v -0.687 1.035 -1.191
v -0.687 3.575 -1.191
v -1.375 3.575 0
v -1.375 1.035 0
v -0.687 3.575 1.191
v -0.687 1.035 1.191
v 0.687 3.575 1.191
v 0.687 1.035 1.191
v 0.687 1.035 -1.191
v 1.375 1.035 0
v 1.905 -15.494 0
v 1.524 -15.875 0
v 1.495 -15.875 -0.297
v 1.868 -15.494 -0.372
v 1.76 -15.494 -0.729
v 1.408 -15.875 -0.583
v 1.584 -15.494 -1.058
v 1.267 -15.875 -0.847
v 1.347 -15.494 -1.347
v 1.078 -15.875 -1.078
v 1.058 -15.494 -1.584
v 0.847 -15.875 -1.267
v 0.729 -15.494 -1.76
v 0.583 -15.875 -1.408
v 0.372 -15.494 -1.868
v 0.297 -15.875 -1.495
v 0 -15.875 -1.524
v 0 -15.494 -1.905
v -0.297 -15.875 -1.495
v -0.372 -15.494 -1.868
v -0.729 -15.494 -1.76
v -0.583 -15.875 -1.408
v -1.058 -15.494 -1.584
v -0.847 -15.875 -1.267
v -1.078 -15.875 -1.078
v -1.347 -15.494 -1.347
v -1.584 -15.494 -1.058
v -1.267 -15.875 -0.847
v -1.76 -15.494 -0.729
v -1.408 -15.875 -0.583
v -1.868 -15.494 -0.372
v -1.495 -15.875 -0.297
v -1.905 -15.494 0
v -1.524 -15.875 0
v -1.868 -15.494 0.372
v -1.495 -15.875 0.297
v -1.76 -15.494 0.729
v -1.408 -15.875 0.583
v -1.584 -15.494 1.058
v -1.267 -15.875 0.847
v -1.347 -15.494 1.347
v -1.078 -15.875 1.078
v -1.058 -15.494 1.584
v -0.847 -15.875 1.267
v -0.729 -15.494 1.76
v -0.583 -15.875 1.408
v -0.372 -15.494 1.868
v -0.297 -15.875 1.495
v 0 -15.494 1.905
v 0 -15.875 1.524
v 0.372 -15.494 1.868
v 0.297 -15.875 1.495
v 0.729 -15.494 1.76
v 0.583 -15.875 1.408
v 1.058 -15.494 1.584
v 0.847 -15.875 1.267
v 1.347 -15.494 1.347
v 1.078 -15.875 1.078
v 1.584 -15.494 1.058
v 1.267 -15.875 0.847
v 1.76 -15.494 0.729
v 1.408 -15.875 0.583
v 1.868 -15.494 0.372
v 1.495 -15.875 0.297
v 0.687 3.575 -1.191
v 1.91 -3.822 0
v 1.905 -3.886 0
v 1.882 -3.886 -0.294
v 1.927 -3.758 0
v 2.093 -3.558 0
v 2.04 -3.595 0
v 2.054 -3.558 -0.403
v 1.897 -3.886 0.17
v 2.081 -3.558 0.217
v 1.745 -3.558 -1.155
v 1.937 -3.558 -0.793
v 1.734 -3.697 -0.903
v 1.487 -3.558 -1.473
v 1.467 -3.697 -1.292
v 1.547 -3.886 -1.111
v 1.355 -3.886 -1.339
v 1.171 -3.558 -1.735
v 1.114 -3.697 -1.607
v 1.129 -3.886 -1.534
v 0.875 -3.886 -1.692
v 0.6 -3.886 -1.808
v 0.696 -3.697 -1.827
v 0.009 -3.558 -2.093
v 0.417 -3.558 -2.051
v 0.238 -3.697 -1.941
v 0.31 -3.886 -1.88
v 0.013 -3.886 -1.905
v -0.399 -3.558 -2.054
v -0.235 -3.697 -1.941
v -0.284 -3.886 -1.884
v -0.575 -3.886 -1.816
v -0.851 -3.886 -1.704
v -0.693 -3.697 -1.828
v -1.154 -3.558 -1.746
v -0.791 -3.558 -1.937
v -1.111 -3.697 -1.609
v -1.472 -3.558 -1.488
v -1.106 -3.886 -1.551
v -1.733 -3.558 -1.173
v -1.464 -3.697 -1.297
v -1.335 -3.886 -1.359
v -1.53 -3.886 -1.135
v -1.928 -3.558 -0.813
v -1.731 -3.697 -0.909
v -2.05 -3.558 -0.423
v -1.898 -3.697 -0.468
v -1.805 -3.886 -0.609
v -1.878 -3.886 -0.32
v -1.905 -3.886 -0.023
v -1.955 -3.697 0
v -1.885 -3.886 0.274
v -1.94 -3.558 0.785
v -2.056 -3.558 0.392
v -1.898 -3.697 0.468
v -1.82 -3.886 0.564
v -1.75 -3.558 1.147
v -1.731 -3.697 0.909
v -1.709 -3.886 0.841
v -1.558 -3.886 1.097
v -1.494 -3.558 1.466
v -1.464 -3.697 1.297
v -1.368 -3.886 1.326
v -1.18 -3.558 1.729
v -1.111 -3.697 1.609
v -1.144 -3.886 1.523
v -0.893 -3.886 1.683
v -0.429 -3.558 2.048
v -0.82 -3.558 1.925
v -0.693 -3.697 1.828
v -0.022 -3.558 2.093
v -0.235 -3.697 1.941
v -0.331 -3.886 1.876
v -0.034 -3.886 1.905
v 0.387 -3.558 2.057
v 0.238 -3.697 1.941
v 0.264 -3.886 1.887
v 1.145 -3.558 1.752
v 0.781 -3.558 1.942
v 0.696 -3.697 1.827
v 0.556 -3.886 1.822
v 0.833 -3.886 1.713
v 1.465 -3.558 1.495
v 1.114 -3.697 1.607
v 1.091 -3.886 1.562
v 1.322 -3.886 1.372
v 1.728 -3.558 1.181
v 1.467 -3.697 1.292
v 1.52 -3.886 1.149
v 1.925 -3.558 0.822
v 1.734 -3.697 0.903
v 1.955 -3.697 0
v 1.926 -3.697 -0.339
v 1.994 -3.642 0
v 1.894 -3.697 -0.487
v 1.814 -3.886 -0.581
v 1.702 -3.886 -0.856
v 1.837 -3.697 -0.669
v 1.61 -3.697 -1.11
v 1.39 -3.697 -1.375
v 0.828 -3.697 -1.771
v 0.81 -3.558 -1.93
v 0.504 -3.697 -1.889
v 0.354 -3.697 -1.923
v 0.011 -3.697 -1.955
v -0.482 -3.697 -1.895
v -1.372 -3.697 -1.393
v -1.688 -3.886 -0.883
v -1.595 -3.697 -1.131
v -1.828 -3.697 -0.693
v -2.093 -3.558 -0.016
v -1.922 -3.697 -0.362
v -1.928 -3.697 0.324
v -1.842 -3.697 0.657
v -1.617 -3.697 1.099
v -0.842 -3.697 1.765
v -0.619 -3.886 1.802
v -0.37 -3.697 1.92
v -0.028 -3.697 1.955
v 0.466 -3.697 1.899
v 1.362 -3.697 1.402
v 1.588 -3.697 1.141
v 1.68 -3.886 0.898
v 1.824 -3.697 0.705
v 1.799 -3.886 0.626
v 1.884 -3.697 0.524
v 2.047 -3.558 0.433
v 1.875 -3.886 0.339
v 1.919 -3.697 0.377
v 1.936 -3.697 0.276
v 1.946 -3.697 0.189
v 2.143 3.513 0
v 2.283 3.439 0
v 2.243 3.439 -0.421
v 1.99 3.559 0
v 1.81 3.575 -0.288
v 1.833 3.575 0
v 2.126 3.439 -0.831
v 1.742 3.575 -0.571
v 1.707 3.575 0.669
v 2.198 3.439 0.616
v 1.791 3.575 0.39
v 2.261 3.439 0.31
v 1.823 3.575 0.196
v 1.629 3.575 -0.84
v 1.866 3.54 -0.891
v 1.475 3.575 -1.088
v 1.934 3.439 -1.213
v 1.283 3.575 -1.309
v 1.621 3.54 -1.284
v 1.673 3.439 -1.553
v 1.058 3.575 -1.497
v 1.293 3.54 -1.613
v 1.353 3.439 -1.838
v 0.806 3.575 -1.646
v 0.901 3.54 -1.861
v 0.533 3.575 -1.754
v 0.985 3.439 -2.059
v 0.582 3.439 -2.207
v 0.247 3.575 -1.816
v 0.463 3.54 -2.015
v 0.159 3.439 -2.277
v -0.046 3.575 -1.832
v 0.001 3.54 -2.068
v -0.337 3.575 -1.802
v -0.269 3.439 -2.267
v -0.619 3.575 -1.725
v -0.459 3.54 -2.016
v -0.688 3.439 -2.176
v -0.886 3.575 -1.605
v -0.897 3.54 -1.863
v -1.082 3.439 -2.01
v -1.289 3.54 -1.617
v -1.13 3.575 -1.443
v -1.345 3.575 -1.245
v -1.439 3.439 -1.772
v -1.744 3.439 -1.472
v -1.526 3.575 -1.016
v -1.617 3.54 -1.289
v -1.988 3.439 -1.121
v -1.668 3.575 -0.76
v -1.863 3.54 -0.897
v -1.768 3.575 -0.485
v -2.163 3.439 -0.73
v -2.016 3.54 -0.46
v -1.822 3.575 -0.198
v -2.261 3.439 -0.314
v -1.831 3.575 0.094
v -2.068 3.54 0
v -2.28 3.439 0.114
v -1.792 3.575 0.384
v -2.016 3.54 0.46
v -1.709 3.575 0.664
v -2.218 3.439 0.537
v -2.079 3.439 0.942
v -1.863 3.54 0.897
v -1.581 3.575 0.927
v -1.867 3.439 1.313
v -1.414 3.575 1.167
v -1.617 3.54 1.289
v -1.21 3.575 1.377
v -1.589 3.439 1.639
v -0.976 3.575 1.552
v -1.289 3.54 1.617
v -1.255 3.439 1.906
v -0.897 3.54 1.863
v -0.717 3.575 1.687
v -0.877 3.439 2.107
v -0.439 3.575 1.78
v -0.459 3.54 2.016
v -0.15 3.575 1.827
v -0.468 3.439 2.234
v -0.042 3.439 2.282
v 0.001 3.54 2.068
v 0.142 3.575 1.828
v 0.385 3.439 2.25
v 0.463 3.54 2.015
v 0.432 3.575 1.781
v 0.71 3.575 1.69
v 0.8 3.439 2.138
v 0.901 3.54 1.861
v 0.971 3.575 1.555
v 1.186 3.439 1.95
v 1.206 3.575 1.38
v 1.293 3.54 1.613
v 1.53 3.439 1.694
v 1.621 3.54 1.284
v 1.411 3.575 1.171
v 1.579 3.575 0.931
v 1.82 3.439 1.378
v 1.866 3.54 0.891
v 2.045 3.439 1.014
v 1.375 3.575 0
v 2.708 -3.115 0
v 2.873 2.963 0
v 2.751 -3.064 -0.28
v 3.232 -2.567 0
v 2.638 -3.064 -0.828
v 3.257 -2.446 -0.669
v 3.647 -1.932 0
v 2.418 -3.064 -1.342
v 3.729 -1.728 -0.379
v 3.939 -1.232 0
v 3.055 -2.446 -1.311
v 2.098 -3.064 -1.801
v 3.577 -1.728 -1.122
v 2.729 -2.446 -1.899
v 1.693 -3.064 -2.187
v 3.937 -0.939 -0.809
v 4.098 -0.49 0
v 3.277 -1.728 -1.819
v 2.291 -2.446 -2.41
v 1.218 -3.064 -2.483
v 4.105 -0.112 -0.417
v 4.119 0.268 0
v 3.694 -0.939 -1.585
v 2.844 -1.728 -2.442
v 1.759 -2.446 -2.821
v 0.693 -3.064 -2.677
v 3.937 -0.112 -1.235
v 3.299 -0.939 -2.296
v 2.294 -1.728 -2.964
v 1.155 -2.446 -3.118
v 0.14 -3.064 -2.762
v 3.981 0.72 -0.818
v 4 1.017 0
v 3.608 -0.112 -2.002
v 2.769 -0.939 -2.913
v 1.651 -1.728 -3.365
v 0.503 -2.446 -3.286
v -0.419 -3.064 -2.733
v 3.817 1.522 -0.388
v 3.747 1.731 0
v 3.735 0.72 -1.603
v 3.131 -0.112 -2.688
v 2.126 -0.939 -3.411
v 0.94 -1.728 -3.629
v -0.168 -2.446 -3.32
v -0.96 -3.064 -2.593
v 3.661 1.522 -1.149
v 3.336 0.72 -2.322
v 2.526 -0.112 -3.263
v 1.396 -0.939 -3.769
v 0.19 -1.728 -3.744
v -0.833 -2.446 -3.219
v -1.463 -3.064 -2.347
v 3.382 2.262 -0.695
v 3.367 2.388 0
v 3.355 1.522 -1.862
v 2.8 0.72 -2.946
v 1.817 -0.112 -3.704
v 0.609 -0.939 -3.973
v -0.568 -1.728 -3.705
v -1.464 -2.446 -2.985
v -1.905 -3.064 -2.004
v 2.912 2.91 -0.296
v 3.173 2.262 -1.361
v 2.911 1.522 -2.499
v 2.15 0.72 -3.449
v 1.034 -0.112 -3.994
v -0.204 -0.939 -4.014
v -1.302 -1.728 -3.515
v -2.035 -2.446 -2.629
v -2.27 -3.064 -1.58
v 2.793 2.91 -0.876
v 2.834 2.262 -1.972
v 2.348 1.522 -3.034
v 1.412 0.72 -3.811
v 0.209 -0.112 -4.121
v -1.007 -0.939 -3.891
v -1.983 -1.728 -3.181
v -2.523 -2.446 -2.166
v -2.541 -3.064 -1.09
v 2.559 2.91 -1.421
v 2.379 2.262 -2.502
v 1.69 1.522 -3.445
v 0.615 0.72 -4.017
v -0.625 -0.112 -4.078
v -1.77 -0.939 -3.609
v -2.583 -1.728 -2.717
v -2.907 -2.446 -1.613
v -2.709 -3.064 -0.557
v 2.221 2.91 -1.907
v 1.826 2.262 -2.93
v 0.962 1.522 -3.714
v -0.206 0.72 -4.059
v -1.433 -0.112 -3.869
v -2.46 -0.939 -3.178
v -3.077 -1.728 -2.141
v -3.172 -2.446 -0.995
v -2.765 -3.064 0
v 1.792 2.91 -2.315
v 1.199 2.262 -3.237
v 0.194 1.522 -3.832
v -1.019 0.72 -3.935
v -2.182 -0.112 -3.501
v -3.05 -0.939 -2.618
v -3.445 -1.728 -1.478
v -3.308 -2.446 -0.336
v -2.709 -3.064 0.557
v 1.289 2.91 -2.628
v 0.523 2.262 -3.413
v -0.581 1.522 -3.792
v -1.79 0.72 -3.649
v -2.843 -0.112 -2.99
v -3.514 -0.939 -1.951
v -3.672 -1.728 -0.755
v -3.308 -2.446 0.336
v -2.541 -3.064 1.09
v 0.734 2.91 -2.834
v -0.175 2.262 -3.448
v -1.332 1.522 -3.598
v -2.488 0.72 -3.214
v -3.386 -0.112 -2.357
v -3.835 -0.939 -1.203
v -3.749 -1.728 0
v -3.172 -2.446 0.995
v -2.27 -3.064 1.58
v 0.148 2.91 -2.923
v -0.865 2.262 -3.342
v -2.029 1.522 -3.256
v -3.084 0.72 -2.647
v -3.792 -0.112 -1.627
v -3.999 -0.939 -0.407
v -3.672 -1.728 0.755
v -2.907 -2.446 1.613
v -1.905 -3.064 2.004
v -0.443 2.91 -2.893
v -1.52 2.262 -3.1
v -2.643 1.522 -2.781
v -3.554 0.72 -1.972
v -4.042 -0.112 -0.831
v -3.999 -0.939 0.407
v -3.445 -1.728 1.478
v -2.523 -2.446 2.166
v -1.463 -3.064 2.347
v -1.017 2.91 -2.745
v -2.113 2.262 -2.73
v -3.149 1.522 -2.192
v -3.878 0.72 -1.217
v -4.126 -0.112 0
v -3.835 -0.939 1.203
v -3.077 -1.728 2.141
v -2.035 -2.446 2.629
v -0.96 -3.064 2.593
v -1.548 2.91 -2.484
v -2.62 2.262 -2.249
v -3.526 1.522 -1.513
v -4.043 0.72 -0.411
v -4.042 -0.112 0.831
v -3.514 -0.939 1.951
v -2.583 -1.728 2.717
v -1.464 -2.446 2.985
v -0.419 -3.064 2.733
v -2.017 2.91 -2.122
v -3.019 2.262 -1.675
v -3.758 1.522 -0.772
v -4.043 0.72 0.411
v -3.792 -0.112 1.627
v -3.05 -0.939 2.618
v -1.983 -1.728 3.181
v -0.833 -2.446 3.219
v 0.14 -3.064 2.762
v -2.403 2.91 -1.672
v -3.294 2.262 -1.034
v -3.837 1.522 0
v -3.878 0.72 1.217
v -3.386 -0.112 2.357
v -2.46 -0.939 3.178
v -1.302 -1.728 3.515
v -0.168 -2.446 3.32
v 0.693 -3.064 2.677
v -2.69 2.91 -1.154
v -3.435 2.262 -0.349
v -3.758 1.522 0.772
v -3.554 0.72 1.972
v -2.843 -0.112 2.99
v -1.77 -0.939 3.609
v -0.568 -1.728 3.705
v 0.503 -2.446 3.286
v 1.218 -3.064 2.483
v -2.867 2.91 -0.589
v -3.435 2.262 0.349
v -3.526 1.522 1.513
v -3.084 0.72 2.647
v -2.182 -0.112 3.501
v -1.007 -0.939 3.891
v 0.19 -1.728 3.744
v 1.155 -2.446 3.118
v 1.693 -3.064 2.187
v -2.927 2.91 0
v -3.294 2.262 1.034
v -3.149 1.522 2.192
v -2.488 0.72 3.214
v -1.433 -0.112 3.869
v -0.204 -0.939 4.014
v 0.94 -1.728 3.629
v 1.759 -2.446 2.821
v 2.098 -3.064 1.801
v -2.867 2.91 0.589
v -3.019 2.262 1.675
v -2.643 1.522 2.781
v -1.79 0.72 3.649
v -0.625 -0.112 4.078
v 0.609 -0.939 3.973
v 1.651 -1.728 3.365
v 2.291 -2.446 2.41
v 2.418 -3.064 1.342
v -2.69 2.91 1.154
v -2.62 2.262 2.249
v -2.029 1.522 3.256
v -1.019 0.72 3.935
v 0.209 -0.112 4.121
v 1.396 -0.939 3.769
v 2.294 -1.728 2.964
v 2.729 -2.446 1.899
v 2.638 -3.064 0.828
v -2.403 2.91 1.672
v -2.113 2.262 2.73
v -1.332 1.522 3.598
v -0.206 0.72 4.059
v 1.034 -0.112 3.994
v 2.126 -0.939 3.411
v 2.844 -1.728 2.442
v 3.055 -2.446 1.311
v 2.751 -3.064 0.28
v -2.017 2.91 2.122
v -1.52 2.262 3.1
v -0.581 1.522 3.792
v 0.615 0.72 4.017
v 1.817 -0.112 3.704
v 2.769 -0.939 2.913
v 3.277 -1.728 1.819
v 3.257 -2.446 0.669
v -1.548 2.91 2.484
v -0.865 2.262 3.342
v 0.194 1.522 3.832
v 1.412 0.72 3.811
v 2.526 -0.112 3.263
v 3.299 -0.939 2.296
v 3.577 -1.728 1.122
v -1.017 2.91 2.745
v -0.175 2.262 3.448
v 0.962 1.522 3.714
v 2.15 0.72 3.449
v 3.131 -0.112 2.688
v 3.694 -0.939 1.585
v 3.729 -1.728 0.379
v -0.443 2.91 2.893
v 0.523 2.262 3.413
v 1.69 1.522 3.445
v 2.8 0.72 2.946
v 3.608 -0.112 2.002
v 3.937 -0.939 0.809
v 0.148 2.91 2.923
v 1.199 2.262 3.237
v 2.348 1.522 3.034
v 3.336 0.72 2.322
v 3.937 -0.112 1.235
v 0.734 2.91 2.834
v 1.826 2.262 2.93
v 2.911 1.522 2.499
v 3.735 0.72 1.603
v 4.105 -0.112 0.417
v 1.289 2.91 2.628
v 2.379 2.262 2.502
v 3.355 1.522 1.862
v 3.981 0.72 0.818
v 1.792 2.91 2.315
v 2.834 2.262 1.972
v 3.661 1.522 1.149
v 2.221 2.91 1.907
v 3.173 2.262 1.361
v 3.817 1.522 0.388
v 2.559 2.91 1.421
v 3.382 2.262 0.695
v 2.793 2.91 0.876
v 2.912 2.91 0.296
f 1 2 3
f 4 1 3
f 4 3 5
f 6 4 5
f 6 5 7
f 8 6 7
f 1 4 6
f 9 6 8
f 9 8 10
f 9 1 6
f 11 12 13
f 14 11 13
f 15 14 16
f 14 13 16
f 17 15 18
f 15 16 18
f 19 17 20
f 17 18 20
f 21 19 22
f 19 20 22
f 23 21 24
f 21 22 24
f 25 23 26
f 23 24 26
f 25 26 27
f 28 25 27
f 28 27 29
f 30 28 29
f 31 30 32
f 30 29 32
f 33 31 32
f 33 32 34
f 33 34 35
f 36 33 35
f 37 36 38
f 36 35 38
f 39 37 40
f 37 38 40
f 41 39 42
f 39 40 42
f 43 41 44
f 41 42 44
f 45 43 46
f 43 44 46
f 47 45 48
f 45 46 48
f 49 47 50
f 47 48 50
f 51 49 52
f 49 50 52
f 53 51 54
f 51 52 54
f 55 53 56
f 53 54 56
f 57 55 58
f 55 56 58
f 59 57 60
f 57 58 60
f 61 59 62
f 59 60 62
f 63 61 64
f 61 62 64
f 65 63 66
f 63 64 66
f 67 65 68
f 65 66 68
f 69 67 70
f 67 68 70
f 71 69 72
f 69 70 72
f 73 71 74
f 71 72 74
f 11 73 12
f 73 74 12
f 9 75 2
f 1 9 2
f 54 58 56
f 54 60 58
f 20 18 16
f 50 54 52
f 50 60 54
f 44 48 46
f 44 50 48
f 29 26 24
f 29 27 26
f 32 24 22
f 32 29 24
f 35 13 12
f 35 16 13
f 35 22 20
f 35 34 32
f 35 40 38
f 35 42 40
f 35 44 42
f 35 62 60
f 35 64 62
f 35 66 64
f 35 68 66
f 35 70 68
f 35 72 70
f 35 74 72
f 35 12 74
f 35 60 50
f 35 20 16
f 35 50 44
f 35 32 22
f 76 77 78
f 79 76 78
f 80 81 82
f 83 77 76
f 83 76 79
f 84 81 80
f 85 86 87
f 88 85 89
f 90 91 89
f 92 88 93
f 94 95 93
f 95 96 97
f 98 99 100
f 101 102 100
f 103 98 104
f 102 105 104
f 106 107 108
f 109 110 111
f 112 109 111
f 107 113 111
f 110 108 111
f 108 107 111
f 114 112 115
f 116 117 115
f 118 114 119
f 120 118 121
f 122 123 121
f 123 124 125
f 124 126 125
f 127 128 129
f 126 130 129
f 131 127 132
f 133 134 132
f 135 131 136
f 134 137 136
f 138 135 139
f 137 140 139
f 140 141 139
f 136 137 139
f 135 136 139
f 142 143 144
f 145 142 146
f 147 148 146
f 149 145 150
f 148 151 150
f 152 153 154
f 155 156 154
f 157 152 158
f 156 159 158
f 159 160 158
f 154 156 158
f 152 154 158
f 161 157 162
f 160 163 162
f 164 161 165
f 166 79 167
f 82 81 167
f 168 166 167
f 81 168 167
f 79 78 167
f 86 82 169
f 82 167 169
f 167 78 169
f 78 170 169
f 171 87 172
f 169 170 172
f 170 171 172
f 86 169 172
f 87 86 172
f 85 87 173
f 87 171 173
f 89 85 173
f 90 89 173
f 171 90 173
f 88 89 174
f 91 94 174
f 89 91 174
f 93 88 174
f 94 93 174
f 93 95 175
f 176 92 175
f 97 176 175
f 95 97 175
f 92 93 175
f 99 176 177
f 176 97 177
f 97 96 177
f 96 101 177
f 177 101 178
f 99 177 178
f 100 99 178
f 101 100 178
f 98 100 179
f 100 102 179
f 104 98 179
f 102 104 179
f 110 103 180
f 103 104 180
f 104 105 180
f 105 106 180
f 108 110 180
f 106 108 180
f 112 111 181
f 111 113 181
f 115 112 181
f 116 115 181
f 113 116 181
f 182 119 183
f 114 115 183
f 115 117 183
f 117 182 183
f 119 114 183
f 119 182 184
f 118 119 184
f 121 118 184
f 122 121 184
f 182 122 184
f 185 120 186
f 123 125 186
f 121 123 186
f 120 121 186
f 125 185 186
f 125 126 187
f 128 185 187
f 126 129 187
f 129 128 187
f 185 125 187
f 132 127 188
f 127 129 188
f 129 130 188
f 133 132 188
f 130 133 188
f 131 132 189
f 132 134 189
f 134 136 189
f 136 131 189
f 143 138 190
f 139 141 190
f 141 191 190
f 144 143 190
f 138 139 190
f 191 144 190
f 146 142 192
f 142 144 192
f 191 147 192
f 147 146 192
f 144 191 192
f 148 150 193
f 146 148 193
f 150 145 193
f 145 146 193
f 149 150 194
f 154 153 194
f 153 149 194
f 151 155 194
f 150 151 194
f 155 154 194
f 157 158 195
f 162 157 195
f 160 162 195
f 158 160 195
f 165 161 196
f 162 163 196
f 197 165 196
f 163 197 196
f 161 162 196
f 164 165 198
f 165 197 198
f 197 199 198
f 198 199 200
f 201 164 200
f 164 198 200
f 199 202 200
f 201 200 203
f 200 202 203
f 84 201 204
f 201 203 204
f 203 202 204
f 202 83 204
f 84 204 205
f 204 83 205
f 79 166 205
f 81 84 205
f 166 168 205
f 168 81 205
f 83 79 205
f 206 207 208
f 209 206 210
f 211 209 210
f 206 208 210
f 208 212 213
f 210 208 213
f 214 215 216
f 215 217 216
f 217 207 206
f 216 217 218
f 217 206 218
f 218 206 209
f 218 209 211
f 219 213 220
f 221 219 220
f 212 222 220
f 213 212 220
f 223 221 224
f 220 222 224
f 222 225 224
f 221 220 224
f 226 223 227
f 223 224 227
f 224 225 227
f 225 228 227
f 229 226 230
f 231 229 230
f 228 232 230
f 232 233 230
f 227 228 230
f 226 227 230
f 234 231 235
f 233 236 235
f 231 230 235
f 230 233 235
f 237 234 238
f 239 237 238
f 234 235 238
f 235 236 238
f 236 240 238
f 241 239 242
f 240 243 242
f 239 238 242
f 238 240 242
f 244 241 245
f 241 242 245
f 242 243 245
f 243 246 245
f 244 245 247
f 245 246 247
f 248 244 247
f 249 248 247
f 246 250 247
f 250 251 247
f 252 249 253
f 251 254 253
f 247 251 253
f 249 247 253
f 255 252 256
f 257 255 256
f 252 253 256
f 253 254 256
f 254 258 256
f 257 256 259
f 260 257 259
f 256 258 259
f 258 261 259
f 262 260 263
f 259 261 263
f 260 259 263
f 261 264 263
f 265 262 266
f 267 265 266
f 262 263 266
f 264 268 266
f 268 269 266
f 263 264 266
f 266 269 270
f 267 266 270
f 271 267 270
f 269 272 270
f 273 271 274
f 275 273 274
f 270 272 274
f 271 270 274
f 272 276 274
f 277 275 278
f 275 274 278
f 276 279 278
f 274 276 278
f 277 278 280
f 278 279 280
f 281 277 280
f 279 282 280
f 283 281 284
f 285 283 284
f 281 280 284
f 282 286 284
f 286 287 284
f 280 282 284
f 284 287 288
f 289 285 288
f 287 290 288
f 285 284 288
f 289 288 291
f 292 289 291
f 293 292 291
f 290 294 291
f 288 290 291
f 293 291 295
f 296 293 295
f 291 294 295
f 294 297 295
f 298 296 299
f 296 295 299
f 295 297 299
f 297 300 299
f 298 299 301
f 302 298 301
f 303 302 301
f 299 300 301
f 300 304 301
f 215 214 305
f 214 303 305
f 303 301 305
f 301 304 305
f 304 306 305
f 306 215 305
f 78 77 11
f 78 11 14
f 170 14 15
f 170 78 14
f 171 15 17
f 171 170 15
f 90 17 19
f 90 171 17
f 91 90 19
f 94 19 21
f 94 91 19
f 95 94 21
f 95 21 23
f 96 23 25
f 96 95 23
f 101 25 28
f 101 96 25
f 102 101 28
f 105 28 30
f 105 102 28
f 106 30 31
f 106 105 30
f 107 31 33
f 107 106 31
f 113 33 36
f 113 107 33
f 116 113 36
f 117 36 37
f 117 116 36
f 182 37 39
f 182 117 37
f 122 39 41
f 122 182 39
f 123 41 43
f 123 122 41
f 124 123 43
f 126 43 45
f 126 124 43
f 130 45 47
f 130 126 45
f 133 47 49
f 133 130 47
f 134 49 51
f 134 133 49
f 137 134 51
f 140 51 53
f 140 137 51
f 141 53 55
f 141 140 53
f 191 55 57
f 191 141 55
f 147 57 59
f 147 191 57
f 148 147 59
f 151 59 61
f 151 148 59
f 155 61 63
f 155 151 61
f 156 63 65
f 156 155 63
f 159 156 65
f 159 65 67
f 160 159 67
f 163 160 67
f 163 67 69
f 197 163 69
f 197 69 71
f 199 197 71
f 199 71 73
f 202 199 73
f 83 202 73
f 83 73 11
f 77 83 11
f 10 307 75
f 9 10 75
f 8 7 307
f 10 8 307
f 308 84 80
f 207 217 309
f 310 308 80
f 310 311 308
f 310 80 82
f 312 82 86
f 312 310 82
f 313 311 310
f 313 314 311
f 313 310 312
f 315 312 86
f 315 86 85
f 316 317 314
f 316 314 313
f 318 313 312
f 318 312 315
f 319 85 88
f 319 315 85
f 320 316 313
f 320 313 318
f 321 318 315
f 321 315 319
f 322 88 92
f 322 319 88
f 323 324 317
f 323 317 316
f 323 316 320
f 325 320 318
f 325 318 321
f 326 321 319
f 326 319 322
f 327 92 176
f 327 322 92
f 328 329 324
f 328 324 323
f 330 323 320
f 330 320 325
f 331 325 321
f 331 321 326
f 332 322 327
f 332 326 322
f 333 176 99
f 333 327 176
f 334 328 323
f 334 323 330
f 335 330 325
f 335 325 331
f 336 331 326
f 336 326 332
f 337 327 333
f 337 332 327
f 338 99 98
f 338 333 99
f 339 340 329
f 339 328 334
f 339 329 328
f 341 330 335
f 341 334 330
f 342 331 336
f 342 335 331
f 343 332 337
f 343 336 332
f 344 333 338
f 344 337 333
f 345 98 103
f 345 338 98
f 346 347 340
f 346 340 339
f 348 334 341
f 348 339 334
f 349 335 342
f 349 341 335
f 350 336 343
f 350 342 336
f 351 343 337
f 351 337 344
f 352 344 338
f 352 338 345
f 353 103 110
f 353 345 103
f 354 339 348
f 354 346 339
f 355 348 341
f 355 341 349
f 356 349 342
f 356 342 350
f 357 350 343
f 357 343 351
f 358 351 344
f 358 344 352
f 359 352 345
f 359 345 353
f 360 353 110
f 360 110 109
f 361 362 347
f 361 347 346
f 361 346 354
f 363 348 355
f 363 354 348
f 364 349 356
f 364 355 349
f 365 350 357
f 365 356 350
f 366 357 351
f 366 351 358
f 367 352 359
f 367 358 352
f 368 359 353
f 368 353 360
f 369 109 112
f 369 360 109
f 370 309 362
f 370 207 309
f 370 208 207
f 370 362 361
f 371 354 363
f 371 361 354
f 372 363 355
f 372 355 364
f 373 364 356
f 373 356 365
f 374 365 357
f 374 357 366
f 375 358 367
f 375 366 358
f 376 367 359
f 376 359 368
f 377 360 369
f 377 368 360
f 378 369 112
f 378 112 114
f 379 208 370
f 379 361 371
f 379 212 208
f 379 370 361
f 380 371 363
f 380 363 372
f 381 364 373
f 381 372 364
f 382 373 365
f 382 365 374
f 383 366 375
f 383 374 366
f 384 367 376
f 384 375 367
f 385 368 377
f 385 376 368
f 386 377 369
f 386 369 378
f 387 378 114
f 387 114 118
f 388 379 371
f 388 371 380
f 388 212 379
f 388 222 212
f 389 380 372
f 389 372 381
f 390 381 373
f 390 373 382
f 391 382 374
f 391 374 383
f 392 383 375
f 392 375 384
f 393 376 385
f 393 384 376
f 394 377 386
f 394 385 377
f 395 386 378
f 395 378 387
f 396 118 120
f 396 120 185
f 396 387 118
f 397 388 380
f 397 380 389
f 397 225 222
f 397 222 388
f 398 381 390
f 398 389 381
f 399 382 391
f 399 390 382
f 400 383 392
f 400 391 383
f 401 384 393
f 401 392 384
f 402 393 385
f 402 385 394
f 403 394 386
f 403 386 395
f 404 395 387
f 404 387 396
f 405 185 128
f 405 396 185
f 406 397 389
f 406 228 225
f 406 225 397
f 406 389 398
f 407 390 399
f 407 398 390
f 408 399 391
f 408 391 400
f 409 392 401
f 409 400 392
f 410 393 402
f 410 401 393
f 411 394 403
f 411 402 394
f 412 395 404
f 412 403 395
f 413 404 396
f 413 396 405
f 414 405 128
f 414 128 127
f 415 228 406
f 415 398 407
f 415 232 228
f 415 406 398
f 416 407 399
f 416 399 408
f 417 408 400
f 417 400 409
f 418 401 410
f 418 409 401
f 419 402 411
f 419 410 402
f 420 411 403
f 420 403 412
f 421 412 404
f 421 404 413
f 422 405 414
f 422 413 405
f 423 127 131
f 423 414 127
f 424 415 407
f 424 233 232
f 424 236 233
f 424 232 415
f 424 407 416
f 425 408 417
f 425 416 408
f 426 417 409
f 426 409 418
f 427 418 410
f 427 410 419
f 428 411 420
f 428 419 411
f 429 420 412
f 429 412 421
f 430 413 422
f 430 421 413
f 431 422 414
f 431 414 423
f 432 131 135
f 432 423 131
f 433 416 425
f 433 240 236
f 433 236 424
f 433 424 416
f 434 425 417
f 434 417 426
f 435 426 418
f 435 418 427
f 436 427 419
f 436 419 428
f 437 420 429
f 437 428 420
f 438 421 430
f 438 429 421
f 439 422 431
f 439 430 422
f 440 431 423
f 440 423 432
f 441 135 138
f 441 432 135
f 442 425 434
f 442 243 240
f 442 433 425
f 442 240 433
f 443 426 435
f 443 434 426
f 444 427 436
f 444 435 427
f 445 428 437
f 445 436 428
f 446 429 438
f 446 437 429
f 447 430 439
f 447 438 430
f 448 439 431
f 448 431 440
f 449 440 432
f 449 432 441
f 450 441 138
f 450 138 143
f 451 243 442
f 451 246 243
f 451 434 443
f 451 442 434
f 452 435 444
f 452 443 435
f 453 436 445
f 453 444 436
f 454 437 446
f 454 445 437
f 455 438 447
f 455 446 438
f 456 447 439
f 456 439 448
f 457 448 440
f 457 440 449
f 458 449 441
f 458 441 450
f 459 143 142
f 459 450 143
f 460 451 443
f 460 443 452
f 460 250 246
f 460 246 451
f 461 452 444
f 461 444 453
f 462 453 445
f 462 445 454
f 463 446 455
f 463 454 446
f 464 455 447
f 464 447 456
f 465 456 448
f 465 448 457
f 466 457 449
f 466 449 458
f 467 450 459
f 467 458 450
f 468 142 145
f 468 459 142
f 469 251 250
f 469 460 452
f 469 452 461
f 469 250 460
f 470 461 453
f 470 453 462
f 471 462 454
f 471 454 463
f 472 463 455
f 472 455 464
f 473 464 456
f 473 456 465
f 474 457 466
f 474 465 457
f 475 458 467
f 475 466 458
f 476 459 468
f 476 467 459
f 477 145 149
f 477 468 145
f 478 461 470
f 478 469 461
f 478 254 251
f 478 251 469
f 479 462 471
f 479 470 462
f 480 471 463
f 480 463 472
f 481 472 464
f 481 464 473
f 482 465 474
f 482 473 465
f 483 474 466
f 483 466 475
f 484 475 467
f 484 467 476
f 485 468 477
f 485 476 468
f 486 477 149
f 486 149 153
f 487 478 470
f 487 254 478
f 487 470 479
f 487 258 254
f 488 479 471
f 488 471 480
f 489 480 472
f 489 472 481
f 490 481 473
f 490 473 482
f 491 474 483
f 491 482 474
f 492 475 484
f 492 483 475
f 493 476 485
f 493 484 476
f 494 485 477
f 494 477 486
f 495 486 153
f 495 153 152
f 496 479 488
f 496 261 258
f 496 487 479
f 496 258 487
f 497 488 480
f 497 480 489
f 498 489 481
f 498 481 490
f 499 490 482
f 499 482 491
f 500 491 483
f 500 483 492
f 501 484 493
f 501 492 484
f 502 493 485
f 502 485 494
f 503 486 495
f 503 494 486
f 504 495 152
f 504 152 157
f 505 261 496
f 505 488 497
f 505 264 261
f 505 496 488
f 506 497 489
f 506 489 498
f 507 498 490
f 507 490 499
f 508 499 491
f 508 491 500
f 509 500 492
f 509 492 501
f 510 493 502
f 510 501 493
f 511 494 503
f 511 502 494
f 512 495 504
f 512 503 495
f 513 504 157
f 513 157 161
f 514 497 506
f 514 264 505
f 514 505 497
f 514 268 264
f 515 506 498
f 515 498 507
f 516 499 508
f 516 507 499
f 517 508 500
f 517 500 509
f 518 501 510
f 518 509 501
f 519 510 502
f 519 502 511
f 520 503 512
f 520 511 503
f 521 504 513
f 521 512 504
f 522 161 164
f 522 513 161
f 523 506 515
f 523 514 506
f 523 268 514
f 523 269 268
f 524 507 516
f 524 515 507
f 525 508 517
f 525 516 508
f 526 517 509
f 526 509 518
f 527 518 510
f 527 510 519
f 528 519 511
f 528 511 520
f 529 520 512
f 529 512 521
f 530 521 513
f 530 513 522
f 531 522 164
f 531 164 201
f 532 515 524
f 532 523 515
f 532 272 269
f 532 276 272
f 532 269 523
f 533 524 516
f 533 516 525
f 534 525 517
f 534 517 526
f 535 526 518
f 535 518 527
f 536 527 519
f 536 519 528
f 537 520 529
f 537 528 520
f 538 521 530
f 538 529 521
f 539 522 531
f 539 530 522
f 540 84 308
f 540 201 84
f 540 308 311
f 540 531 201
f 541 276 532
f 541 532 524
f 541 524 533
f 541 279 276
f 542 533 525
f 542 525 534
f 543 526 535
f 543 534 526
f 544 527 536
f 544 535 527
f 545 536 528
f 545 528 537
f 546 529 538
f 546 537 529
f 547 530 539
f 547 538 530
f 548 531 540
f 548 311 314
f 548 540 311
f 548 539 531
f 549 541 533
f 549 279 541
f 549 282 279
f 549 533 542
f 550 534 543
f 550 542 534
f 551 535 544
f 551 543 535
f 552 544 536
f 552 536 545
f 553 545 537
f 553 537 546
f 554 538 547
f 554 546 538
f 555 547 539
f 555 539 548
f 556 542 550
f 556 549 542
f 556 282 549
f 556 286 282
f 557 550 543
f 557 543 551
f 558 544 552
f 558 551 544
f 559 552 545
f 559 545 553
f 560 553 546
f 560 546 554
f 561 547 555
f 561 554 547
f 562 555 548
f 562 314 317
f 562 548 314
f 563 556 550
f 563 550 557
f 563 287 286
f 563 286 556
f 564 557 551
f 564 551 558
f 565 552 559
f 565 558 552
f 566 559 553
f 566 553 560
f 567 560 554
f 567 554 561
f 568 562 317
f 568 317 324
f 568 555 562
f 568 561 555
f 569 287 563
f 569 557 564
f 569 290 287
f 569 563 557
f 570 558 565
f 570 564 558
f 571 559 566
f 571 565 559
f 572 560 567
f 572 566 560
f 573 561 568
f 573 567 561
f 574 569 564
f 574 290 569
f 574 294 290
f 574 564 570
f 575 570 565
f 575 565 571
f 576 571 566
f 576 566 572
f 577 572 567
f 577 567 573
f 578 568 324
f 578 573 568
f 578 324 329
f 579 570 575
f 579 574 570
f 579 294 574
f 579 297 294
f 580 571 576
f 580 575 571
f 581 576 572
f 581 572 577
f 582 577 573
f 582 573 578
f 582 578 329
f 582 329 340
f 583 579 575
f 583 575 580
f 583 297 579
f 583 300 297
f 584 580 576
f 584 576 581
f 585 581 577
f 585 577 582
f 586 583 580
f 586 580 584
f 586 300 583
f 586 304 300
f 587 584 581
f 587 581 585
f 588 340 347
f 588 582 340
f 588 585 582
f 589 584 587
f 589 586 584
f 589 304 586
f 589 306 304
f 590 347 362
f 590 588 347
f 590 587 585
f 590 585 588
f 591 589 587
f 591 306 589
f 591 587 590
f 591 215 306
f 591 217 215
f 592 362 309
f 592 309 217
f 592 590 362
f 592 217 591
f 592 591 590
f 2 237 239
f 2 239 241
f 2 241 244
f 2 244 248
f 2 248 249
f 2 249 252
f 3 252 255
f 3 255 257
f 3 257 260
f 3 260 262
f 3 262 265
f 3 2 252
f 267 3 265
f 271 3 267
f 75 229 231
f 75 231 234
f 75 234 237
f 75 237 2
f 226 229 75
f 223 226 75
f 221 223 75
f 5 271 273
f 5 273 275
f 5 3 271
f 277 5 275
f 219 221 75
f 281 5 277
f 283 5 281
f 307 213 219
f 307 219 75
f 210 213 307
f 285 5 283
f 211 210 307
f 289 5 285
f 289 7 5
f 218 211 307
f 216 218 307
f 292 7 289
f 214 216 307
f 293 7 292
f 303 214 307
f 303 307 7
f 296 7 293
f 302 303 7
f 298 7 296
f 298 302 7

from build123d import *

# Parameters (mm, degrees)
FILLET1_R          = 0.381
CHAMFER1_SIZE      = 0.381
FILLET2_R          = 0.8128
CUT_EXTRUDE1_DEPTH = 2.54


with BuildPart() as part:
    # Sketch1 → Revolve1 (revolve)
    with BuildSketch(Plane.XY, mode=Mode.PRIVATE) as revolve1_sk:
        with BuildLine():
            Line((0, -15.875), (-1.905, -15.875))
            Line((-1.905, -15.875), (-1.905, -3.661588624))
            ThreePointArc((-1.905, -3.661588624), (-4.009330573, 0.980573609), (0, 4.1275))
            Line((0, 4.1275), (0, -15.875))
        make_face()
    revolve(revolve1_sk.sketch.rotate(Axis((0, -648.634401367, 0), (0, 1, 0)), 180), axis=Axis((0, -648.634401367, 0), (0, 1, 0)))

    # Fillet1
    fillet1_edges = [part.edges().sort_by_distance(p)[0] for p in [
        (-1.905, -3.661588624, 0),
    ]]
    fillet(fillet1_edges, radius=FILLET1_R)

    # Chamfer1
    chamfer1_edges = [part.edges().sort_by_distance(p)[0] for p in [
        (-1.905, -15.875, 0),
    ]]
    chamfer(chamfer1_edges, length=CHAMFER1_SIZE)

    # Split1
    split(bisect_by=Plane.ZX.offset(3.574519854), keep=Keep.BOTTOM)

    # Fillet2
    fillet2_edges = [part.edges().sort_by_distance(p)[0] for p in [
        (-2.06375, 3.574519854, 0),
    ]]
    fillet(fillet2_edges, radius=FILLET2_R)

    # Sketch3 → Cut-Extrude1 (cut)
    with BuildSketch(Plane(origin=(0, 3.574519854, 0), x_dir=(1, 0, 0), z_dir=(0, 1, 0))):
        Polygon((0.687407664, 1.190625), (-0.687407664, 1.190625), (-1.374815329, 0), (-0.687407664, -1.190625), (0.687407664, -1.190625), (1.374815329, 0), align=None)
    extrude(amount=-CUT_EXTRUDE1_DEPTH, mode=Mode.SUBTRACT)


solid = part.part
